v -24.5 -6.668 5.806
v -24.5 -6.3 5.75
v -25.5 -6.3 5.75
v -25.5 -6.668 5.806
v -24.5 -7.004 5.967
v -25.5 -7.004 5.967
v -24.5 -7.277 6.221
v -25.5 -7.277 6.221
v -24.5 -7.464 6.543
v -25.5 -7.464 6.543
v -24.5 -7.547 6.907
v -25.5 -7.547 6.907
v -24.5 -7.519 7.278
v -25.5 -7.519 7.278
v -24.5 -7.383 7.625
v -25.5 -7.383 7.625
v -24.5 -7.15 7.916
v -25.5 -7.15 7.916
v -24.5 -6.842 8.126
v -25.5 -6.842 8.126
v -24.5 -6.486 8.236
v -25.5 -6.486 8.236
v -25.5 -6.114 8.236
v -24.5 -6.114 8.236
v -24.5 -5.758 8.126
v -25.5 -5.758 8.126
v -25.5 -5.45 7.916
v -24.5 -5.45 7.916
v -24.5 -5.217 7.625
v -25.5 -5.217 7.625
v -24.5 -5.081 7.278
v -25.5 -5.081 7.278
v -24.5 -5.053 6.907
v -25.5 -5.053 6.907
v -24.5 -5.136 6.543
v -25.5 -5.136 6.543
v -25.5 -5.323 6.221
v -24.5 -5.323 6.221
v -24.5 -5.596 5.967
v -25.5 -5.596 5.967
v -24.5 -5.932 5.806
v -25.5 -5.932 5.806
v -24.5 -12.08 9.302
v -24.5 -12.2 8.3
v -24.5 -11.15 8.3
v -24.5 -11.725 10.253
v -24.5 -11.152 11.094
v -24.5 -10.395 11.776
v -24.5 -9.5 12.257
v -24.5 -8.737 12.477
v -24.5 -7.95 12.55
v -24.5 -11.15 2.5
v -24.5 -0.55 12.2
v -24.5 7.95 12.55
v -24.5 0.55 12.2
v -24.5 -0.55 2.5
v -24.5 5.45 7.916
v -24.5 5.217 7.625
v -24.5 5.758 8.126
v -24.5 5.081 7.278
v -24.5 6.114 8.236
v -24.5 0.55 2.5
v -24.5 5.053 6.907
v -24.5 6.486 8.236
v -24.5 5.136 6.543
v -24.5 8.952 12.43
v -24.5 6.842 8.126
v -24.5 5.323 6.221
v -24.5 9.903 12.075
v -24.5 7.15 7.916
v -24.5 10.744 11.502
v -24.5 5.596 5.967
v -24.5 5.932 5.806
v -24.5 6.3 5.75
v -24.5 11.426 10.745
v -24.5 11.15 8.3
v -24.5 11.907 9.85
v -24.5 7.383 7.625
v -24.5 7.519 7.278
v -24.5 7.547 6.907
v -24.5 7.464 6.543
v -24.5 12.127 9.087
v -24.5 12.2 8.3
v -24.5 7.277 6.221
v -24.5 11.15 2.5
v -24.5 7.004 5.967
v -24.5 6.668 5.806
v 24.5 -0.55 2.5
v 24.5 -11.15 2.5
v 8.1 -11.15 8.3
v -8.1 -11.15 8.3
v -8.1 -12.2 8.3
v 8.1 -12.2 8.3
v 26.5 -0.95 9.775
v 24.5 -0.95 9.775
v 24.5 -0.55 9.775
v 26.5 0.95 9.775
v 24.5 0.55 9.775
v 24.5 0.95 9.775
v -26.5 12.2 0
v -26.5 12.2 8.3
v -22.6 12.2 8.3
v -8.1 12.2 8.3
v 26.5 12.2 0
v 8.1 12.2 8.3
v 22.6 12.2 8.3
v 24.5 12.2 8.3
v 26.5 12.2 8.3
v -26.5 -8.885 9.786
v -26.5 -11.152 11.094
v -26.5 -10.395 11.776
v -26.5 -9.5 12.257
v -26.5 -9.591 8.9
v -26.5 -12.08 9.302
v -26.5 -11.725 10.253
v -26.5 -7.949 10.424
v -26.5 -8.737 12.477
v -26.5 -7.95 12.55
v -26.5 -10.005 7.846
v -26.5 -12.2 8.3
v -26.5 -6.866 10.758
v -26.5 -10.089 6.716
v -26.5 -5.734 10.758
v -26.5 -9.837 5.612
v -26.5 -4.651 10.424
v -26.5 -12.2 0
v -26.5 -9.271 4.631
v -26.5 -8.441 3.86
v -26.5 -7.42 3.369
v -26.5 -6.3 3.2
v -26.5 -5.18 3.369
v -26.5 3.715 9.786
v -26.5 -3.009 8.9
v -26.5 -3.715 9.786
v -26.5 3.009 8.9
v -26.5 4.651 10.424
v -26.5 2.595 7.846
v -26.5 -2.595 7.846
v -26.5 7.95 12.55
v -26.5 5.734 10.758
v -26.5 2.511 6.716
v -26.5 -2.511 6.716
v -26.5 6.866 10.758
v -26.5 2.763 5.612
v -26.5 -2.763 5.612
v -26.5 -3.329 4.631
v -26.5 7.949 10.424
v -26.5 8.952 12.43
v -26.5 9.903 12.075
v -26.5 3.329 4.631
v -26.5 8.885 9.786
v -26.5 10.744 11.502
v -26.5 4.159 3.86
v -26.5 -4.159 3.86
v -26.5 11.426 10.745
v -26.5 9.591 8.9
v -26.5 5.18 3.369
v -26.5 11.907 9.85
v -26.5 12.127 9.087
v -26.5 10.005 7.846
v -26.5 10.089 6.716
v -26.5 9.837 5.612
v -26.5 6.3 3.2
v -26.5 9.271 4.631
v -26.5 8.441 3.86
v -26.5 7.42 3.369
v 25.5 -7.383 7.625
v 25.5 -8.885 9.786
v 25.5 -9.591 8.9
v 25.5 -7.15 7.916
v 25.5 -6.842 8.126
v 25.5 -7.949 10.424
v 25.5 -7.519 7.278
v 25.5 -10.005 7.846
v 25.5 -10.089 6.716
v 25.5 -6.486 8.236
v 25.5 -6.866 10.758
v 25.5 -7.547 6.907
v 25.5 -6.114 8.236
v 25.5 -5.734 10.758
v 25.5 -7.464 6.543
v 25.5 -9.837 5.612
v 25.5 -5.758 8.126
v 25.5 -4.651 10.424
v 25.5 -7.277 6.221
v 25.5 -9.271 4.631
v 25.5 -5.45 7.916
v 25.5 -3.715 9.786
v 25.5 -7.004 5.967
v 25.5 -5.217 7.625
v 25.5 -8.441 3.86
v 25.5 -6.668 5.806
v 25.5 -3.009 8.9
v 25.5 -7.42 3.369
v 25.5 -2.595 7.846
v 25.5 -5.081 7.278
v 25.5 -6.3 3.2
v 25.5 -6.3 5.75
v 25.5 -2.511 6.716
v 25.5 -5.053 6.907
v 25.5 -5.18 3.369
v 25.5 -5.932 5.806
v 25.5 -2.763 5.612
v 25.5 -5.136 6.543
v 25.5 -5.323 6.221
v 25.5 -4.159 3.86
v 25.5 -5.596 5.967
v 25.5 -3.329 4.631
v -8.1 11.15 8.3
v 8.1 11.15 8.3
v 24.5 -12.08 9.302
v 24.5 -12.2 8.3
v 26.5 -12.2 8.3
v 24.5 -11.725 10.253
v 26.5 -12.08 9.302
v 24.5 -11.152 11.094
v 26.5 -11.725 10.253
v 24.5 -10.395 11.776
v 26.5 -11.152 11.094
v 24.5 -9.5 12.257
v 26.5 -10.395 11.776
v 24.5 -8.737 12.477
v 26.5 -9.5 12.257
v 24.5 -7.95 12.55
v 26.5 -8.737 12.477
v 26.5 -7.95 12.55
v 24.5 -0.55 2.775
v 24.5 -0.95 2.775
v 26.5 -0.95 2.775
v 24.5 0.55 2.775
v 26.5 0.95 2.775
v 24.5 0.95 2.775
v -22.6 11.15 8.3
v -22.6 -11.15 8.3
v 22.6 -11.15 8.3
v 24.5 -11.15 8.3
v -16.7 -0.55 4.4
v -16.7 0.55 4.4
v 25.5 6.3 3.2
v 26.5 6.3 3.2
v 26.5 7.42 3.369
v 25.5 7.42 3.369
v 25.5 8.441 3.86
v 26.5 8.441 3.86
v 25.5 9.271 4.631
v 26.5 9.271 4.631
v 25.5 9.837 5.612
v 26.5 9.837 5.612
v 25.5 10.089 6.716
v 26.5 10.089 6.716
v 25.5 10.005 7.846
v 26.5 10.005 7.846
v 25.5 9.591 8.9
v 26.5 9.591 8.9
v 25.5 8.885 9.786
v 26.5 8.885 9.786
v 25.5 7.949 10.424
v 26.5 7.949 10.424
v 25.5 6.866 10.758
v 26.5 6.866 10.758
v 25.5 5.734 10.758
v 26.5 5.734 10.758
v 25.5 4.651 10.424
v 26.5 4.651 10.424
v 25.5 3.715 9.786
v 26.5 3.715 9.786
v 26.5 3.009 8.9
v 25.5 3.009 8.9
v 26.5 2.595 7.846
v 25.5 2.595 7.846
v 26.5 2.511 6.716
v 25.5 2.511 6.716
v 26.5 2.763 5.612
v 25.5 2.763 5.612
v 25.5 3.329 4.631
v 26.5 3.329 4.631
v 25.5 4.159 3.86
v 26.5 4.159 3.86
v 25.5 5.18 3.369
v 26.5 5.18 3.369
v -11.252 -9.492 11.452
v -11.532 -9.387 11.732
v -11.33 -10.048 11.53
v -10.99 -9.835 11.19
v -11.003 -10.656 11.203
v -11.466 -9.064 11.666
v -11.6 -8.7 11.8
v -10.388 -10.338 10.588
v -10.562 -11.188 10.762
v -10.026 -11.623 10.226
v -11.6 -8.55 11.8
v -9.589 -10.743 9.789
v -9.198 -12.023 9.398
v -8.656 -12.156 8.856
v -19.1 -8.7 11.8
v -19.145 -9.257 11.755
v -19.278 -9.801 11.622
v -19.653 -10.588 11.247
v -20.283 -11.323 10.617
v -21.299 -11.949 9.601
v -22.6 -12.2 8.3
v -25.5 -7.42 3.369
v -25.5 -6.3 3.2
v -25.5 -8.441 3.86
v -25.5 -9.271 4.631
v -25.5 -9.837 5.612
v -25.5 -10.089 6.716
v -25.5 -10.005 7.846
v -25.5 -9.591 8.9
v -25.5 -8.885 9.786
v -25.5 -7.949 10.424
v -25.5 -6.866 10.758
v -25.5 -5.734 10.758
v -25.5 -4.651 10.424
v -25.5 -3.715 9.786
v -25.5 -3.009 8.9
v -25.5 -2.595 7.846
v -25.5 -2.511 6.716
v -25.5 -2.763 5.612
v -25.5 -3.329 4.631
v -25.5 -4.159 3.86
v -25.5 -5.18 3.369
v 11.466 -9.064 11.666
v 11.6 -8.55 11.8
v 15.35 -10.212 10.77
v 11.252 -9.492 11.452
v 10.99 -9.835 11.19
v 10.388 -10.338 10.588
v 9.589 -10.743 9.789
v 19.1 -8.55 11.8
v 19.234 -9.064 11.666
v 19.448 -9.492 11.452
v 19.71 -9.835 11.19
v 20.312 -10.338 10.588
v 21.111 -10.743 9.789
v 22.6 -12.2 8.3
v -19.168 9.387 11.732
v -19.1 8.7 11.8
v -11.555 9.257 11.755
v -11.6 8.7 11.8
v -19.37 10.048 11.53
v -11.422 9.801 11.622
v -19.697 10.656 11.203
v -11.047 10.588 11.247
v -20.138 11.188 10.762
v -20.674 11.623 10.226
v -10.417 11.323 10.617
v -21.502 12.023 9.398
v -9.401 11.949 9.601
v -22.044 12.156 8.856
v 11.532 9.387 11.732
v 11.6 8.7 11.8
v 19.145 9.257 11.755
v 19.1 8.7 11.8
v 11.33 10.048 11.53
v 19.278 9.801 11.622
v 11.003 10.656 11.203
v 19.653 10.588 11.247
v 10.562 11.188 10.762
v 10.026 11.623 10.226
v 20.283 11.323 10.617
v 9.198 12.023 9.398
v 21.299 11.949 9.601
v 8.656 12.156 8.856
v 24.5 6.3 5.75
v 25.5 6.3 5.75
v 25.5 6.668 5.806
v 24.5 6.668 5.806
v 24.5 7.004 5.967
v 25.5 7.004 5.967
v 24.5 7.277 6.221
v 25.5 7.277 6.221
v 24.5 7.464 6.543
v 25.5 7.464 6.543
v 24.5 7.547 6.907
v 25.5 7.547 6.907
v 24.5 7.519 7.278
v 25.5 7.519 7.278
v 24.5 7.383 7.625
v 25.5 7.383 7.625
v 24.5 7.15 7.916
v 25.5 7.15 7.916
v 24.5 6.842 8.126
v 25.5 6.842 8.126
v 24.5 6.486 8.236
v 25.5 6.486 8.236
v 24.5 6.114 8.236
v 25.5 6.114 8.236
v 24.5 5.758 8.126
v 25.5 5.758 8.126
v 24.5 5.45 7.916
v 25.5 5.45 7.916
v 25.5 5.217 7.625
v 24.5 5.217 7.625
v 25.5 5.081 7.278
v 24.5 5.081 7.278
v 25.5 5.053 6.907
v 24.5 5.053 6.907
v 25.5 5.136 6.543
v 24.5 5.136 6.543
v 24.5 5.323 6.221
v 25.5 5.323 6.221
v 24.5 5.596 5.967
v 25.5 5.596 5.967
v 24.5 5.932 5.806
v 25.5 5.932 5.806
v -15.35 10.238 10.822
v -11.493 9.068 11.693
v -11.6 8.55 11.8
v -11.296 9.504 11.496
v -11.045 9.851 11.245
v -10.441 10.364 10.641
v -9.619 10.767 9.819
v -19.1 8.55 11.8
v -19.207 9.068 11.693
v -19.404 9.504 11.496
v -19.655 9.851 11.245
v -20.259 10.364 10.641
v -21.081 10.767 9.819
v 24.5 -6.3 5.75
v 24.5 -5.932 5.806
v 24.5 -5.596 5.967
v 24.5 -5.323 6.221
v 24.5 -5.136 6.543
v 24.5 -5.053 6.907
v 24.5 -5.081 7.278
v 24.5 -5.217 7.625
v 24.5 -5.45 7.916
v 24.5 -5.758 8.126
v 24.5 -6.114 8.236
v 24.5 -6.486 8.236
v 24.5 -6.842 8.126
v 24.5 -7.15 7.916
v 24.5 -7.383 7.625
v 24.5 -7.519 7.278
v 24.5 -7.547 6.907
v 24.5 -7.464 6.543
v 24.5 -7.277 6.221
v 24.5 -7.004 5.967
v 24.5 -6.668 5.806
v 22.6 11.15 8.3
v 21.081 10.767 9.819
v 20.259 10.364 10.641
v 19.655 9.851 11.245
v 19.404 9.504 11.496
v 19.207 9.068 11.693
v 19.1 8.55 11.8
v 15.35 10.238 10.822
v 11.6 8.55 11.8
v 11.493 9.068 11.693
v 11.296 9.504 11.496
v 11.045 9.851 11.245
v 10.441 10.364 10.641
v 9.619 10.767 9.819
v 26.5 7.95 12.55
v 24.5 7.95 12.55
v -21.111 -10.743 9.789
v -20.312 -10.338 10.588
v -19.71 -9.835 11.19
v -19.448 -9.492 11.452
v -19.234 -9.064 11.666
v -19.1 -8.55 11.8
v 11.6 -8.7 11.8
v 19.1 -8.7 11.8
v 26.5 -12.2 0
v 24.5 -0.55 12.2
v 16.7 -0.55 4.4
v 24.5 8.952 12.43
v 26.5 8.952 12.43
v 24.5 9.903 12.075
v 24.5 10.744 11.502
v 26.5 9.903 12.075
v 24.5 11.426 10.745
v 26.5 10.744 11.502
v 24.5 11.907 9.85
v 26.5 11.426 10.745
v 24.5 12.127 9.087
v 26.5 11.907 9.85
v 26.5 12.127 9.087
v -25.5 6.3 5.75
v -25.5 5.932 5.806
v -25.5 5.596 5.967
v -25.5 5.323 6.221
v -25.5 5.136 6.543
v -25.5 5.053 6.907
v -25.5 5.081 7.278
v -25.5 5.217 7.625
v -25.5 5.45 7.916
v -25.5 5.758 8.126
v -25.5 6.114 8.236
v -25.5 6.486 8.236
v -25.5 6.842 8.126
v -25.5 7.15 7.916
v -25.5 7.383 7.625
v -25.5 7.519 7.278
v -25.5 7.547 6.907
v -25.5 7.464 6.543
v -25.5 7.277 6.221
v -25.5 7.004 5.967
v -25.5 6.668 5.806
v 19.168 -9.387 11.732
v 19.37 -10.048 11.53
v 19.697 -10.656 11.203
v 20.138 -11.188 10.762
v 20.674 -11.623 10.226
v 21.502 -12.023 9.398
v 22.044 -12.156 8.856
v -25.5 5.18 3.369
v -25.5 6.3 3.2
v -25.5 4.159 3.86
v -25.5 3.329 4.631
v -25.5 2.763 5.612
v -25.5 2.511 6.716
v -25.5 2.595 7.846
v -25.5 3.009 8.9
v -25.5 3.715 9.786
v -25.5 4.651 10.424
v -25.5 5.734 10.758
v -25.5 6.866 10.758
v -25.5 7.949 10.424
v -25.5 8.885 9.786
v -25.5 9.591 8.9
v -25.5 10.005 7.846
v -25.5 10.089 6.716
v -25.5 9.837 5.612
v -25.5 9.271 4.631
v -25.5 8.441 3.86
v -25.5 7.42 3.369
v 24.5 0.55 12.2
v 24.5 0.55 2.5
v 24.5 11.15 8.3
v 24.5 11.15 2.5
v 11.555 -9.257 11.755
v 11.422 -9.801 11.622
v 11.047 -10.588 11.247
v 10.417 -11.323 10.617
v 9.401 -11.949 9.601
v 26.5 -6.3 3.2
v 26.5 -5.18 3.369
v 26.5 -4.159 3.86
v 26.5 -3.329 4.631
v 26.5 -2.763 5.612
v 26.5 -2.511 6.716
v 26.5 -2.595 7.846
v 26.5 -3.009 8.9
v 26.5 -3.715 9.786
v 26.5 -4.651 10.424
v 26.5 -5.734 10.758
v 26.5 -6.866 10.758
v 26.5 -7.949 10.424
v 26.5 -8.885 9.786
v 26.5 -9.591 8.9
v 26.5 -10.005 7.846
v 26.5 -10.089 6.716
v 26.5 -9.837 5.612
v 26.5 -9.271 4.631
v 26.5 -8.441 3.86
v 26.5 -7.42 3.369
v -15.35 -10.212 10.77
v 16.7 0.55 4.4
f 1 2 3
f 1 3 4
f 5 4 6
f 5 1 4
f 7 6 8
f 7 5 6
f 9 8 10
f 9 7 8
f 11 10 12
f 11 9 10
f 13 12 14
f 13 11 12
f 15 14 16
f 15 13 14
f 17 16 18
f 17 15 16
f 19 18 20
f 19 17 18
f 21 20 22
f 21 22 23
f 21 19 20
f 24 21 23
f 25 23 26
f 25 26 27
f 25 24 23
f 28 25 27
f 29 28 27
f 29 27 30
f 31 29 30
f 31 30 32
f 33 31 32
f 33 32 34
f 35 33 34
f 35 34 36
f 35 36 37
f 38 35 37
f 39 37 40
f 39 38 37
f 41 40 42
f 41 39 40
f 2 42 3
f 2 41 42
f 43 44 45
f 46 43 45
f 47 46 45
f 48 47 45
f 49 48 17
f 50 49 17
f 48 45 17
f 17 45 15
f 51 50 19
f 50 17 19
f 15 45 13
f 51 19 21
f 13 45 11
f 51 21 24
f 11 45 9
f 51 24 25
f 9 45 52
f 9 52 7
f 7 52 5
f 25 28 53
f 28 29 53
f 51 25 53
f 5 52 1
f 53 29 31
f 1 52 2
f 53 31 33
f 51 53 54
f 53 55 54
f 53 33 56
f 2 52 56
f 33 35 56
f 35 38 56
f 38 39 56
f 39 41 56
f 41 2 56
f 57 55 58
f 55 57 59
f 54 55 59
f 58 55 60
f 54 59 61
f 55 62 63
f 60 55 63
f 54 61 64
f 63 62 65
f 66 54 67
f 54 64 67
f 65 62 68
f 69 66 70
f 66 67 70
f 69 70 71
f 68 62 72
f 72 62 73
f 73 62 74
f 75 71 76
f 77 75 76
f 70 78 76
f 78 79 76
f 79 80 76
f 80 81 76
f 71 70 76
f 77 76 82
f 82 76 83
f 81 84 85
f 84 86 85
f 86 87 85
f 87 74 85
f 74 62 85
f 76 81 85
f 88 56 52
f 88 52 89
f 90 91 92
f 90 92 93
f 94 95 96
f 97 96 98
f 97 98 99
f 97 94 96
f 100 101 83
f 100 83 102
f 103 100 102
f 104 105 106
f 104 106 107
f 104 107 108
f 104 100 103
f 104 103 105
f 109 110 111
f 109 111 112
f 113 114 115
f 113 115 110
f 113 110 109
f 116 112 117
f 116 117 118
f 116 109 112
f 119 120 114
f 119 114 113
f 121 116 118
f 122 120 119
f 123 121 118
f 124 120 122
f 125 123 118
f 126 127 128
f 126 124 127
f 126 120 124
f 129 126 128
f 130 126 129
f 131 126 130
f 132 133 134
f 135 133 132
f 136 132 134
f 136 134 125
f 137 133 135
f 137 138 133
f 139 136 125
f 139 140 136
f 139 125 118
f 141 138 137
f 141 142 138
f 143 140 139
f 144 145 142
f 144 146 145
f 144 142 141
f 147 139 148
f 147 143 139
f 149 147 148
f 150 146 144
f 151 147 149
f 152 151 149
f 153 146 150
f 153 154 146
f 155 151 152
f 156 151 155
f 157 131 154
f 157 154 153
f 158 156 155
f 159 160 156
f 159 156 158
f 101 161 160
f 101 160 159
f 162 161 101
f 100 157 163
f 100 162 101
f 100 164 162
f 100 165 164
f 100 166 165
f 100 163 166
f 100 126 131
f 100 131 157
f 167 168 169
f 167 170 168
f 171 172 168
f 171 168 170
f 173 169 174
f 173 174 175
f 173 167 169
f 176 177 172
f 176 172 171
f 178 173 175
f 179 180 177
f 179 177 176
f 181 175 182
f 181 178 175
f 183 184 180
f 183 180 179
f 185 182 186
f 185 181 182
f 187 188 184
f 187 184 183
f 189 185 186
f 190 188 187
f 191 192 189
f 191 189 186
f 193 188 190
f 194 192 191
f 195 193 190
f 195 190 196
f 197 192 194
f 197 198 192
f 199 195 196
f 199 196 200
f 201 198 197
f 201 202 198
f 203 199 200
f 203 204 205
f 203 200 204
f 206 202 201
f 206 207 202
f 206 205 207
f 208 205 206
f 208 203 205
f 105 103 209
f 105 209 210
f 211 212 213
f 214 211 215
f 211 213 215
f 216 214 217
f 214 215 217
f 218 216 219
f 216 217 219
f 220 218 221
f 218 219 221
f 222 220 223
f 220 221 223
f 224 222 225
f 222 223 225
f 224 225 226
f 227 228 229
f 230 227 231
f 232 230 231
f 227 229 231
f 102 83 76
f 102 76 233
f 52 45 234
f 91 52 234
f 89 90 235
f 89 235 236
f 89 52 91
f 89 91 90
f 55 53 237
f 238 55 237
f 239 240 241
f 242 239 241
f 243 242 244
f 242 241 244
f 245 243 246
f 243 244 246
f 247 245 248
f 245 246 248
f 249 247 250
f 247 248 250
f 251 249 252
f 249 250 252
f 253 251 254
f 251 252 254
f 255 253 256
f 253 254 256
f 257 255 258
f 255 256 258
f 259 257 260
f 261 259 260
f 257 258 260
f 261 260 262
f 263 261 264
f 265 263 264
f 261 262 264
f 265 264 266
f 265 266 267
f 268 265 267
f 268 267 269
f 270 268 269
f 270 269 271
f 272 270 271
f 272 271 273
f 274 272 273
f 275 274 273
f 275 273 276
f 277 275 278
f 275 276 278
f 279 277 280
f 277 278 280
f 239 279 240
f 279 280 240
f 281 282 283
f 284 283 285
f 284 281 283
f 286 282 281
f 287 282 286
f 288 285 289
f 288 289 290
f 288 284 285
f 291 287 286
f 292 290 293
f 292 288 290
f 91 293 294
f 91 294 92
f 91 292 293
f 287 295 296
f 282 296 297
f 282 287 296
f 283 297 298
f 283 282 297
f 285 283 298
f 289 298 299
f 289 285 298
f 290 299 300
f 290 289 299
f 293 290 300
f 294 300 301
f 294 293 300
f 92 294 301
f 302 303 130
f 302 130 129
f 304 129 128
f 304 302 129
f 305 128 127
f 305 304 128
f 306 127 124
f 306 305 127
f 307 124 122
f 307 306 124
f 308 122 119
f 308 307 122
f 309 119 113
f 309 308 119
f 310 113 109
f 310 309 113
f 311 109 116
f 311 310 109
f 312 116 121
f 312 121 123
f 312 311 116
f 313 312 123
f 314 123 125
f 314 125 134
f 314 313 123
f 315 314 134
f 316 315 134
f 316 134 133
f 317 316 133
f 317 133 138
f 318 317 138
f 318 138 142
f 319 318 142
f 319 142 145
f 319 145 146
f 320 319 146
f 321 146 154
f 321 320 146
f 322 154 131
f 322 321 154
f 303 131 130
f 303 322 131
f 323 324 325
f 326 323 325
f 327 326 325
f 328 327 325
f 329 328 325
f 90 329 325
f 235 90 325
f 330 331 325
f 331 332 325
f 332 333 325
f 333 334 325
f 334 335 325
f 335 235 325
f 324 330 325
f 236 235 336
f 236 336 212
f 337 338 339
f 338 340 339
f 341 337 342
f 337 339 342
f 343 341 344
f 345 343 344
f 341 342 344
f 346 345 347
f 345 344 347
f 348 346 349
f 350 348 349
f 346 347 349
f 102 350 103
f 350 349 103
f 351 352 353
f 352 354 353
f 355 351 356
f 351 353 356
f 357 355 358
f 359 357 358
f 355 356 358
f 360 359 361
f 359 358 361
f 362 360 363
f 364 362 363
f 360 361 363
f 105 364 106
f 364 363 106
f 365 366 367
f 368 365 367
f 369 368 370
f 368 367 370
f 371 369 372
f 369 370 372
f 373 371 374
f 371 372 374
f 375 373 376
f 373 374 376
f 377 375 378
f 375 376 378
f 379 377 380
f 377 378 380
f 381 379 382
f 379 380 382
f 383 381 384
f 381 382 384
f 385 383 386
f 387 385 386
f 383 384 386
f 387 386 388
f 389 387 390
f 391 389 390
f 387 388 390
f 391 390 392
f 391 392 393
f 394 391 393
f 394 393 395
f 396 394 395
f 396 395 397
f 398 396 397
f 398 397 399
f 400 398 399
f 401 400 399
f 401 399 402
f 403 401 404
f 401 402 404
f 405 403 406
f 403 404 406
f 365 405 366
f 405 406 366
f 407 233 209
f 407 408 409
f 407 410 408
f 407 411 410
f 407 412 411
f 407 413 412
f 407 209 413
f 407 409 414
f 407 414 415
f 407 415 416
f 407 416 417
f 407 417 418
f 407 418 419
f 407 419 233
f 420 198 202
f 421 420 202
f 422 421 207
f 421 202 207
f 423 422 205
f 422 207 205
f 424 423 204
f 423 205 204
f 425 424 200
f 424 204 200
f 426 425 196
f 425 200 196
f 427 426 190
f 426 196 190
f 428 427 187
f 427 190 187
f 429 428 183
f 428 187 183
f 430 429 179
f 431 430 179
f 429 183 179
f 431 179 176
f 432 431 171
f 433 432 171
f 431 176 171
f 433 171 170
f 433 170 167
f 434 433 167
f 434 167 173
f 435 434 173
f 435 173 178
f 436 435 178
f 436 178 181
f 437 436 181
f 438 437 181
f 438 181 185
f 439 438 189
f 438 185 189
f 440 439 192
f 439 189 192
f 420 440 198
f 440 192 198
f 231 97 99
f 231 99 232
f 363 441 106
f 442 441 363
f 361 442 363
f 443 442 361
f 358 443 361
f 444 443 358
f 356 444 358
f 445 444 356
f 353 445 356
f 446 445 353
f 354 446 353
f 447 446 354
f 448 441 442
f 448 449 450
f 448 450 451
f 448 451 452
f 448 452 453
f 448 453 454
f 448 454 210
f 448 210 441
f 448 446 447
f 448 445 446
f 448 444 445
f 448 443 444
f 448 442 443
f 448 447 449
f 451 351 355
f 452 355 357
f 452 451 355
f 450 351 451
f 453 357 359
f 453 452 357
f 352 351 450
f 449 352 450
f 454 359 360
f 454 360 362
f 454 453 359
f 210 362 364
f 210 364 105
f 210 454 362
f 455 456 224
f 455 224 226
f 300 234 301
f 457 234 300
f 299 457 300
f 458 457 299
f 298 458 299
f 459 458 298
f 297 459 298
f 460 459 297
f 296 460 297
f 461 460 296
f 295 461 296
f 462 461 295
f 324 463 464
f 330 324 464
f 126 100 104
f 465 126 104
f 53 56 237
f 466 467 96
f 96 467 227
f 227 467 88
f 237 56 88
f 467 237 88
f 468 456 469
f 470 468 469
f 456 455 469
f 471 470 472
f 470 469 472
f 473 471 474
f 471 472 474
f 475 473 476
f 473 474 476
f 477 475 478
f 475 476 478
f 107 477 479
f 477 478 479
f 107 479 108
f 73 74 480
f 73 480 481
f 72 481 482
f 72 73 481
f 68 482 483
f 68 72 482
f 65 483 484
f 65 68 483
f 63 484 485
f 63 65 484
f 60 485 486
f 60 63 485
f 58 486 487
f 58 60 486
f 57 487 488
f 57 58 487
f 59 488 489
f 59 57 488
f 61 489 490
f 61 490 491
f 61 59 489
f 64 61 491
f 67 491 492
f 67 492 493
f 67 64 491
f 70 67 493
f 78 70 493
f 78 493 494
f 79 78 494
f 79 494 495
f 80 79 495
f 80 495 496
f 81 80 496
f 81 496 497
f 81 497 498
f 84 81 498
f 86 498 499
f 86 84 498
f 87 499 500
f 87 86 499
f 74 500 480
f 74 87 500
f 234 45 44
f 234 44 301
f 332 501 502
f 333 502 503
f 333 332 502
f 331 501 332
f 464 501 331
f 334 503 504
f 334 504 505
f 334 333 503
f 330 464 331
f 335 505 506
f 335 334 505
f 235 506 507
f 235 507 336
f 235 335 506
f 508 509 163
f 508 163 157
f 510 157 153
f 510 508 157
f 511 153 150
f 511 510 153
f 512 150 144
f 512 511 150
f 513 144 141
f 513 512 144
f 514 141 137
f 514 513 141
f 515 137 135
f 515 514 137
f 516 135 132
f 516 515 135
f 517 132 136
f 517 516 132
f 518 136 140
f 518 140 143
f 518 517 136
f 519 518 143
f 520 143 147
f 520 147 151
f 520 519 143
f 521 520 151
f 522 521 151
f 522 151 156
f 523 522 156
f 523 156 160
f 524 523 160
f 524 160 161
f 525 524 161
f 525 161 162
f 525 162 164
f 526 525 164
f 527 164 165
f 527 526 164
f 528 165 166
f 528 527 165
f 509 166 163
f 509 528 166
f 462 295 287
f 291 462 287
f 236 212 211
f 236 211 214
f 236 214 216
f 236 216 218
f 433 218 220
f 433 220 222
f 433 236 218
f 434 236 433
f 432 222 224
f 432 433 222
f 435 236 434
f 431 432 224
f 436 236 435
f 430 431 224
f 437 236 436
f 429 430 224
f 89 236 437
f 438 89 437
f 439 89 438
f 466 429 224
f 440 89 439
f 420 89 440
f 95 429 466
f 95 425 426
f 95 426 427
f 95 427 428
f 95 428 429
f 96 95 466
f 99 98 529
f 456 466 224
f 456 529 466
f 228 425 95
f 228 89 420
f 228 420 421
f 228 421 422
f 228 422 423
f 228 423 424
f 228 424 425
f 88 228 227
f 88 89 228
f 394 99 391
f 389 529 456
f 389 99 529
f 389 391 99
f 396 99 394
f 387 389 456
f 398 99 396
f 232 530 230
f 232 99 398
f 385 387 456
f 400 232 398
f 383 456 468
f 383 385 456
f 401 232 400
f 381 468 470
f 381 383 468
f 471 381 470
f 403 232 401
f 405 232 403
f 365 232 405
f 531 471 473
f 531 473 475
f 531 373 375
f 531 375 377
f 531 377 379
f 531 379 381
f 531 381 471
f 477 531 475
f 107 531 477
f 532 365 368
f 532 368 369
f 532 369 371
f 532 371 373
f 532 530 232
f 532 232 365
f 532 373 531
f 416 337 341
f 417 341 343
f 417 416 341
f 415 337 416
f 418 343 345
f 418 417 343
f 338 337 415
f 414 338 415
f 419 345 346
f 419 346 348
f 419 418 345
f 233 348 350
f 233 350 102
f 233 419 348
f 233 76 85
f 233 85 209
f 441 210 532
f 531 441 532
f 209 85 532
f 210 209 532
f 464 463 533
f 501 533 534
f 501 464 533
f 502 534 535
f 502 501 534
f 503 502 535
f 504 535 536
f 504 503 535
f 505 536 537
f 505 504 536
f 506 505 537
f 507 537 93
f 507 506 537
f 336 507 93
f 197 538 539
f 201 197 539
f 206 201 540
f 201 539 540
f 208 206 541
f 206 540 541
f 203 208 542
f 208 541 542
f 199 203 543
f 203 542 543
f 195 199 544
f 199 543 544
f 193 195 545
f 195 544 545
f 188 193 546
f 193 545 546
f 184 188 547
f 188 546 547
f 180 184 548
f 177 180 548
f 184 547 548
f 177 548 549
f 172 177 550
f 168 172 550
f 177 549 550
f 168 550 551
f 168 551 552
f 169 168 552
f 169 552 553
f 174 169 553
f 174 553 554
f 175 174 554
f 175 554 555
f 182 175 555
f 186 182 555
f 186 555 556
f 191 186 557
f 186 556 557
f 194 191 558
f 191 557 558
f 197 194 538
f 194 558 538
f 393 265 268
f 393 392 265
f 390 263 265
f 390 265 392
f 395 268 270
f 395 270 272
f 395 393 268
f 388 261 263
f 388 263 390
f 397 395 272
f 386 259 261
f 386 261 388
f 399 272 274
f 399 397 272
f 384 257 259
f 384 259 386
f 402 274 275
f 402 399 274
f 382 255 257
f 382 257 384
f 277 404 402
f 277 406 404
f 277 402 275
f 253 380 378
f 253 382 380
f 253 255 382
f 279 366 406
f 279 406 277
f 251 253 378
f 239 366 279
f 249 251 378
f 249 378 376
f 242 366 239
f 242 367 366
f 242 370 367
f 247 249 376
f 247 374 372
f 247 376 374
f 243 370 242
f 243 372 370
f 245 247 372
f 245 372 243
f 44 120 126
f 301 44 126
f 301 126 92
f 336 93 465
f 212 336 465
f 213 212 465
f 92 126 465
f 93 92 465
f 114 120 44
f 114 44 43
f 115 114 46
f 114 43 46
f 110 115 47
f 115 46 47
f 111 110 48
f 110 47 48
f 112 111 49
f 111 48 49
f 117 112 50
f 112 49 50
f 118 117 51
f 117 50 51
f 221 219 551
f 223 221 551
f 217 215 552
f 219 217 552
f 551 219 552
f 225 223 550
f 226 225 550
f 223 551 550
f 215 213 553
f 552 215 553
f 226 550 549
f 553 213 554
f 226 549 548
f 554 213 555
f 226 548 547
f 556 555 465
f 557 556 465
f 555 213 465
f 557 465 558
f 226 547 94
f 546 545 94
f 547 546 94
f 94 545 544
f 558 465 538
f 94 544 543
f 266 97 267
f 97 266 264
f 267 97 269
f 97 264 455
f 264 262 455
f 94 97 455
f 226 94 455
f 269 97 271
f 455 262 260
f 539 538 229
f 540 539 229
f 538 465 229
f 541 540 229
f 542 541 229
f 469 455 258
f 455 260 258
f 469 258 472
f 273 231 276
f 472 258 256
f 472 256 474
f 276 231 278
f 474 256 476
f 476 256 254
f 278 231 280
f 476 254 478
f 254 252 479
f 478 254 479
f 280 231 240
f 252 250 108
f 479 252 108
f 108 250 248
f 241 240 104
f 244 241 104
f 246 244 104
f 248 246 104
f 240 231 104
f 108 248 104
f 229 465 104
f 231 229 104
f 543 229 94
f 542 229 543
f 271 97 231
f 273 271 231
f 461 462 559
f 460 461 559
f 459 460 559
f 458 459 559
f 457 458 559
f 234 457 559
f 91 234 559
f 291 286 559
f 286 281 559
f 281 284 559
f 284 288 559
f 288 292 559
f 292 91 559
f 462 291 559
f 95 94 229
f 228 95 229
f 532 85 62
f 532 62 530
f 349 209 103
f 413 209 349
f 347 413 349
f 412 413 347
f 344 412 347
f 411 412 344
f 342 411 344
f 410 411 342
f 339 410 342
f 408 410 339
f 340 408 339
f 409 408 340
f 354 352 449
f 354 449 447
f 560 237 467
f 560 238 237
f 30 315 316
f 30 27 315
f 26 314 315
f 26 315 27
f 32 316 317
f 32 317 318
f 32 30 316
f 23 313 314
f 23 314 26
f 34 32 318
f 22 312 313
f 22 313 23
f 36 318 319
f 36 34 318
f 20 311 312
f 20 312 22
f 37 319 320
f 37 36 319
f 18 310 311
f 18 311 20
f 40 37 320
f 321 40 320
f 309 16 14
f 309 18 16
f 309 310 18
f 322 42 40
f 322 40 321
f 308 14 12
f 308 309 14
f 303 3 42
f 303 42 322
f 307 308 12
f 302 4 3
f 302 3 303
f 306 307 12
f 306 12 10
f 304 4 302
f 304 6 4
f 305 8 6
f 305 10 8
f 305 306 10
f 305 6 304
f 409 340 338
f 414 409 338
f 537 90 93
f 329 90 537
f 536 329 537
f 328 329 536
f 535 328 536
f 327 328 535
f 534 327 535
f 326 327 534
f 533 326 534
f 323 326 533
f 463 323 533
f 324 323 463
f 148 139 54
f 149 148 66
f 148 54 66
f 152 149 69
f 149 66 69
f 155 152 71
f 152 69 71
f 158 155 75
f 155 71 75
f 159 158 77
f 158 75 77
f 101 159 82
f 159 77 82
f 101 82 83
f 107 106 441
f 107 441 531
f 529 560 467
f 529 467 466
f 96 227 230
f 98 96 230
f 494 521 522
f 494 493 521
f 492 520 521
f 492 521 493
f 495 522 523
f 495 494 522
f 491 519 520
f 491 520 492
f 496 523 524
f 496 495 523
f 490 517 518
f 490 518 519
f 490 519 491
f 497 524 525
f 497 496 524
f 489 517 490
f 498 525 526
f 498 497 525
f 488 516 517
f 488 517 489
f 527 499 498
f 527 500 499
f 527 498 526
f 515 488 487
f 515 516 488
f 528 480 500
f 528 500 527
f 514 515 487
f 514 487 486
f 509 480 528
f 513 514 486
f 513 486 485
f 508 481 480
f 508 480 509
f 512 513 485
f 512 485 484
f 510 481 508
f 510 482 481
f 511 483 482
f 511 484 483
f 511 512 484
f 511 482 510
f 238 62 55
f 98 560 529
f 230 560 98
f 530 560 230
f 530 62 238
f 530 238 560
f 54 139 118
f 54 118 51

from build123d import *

# Parameters (mm, degrees)
SKICA1_W                 = 53
SKICA1_H                 = 24.4
P_IDAT_VYSUNUT_M1_DEPTH  = 2.5
SKICA2_W                 = 49
SKICA2_H                 = 1.05
P_IDAT_VYSUNUT_M2_DEPTH  = 9.3
SKICA3_W                 = 16.2
SKICA3_H                 = 1.05
SKICA3_W_2               = 1.9
ODEBRAT_VYSUNUT_M1_DEPTH = 3.5
SKICA7_W                 = 14.5
SKICA7_H                 = 3.5
P_IDAT_VYSUNUT_M3_DEPTH  = 2.6
SKICA6_W                 = 14.5
SKICA6_H                 = 3.5
P_IDAT_VYSUNUT_M4_DEPTH  = 2.6
SKICA8_W                 = 14.5
SKICA8_H                 = 3.5
P_IDAT_VYSUNUT_M5_DEPTH  = 2.6
ZAOBLIT3_R               = 3.5
ODEBRAT_START            = -45.2
ODEBRAT_VYSUNUT_M2_DEPTH = 45.2
ODEBRAT_VYSUNUT_M3_DEPTH = 45.2
ZKOSEN_3_SIZE            = 3.5
SKICA14_W                = 2
SKICA14_H                = 24.4
P_IDAT_VYSUNUT_M6_DEPTH  = 10.05
ZAOBLIT4_R               = 4.25
SKICA17_W                = 7
SKICA17_H                = 1.9
ODEBRAT_VYSUNUT_M4_DEPTH = 2.05
SKICA18_R                = 3.8
ODEBRAT_VYSUNUT_M5_DEPTH = 1
SKICA20_R                = 1.25
ODEBRAT_VYSUNUT_M6_DEPTH = 1
ODEBRAT_START_2          = -1
SKICA21_R                = 3.8
ODEBRAT_VYSUNUT_M7_DEPTH = 1
SKICA22_R                = 1.25
ODEBRAT_VYSUNUT_M8_DEPTH = 1
SKICA23_W                = 49
SKICA23_H                = 1.1
P_IDAT_VYSUNUT_M7_DEPTH  = 9.7
SKICA24_W                = 26
SKICA24_H                = 1.1
ODEBRAT_VYSUNUT_M9_DEPTH = 7.8


with BuildPart() as part:
    # Skica1 → Přidat vysunutím1 (new body)
    with BuildSketch(Plane.XY):
        Rectangle(SKICA1_W, SKICA1_H)
    extrude(amount=P_IDAT_VYSUNUT_M1_DEPTH)

    # Skica2 → Přidat vysunutím2 (add)
    with BuildSketch(Plane.XY.offset(2.5)):
        with Locations((0, 11.675)):
            Rectangle(SKICA2_W, SKICA2_H)
        with Locations((0, -11.675)):
            Rectangle(SKICA2_W, SKICA2_H)
    extrude(amount=P_IDAT_VYSUNUT_M2_DEPTH)

    # Skica3 → Odebrat vysunutím1 (cut)
    with BuildSketch(Plane.XY.offset(11.8)):
        with Locations((0, -11.675)):
            Rectangle(SKICA3_W, SKICA3_H)
        with Locations((0, 11.675)):
            Rectangle(SKICA3_W, SKICA3_H)
        with Locations((-23.55, 11.675)):
            Rectangle(SKICA3_W_2, SKICA3_H)
        with Locations((-23.55, -11.675)):
            Rectangle(SKICA3_W_2, SKICA3_H)
        with Locations((23.55, 11.675)):
            Rectangle(SKICA3_W_2, SKICA3_H)
        with Locations((23.55, -11.675)):
            Rectangle(SKICA3_W_2, SKICA3_H)
    extrude(amount=-ODEBRAT_VYSUNUT_M1_DEPTH, mode=Mode.SUBTRACT)

    # Skica7 → Přidat vysunutím3 (add)
    with BuildSketch(Plane(origin=(0, 11.15, 0), x_dir=(-1, 0, 0), z_dir=(0, -1, 0))):
        with Locations((15.35, -10.05)):
            Rectangle(SKICA7_W, SKICA7_H)
        with Locations((-15.35, -10.05)):
            Rectangle(SKICA7_W, SKICA7_H)
    extrude(amount=P_IDAT_VYSUNUT_M3_DEPTH)

    # Skica6 → Přidat vysunutím4 (add)
    with BuildSketch(Plane(origin=(0, -11.15, 0), x_dir=(1, 0, 0), z_dir=(0, 1, 0))):
        with Locations((-15.35, -10.05)):
            Rectangle(SKICA6_W, SKICA6_H)
    extrude(amount=P_IDAT_VYSUNUT_M4_DEPTH)

    # Skica8 → Přidat vysunutím5 (add)
    with BuildSketch(Plane(origin=(0, -11.15, 0), x_dir=(1, 0, 0), z_dir=(0, 1, 0))):
        with Locations((15.35, -10.05)):
            Rectangle(SKICA8_W, SKICA8_H)
    extrude(amount=P_IDAT_VYSUNUT_M5_DEPTH)

    # Zaoblit3
    zaoblit3_edges = [part.edges().sort_by_distance(p)[0] for p in [
        (15.35, 12.2, 11.8),
        (-15.35, 12.2, 11.8),
        (-15.35, -12.2, 11.8),
        (15.35, -12.2, 11.8),
    ]]
    fillet(zaoblit3_edges, radius=ZAOBLIT3_R)

    # Skica11 → Odebrat vysunutím2 (cut)
    with BuildSketch(Plane(origin=(22.6, 0, 0), x_dir=(0, 0, -1), z_dir=(1, 0, 0)).offset(ODEBRAT_START)):
        with BuildLine():
            Line((-11.8, -8.55), (-8.3, -8.55))
            Line((-8.3, -8.55), (-8.3, -11.15))
            add(Edge.make_bspline(
                [(-8.3, -11.15), (-11.489612279, -10.573938185), (-11.8, -8.55)],
                knots=[0, 0, 0, 0.822635588, 0.822635588, 0.822635588], degree=2))
        make_face()
    extrude(amount=ODEBRAT_VYSUNUT_M2_DEPTH, mode=Mode.SUBTRACT)

    # Skica13 → Odebrat vysunutím3 (cut)
    with BuildSketch(Plane(origin=(22.6, 0, 0), x_dir=(0, 0, -1), z_dir=(1, 0, 0)).offset(ODEBRAT_START)):
        with BuildLine():
            Line((-11.8, 8.55), (-8.3, 8.55))
            Line((-8.3, 8.55), (-8.3, 11.15))
            add(Edge.make_bspline(
                [(-8.3, 11.15), (-11.594475323, 10.62667069), (-11.8, 8.55)],
                knots=[0, 0, 0, 0.882557327, 0.882557327, 0.882557327], degree=2))
        make_face()
    extrude(amount=ODEBRAT_VYSUNUT_M3_DEPTH, mode=Mode.SUBTRACT)

    # Zkosení3
    # the kernel refuses this chamfer: 3.5 mm, written as the material it takes off along each edge
    with BuildSketch(Plane(origin=(-22.6, 0.450890458, 11.8), x_dir=(-0.027495876610586112, 0, -0.9996219169112968), z_dir=(0, -1, 0)), Plane(origin=(-8.1, 0.450890458, 11.8), x_dir=(-0.9996219169112968, 0, 0.027495876610586605), z_dir=(0, -1, 0)), Plane(origin=(-22.6, -0.450890458, 11.8), x_dir=(0.9996219169112968, 3.891912830509087e-15, 0.02749587661058662), z_dir=(0, 1, 0)), Plane(origin=(-8.1, -0.450890458, 11.8), x_dir=(0.027495876610586605, 0, -0.9996219169112968), z_dir=(0, 1, 0)), Plane(origin=(8.1, -0.450890458, 11.8), x_dir=(0.9996219169112968, 0, 0.027495876610586605), z_dir=(0, 1, 0)), Plane(origin=(22.6, -0.450890458, 11.8), x_dir=(0.027495876610586112, 0, -0.9996219169112968), z_dir=(0, 1, 0)), Plane(origin=(8.1, 0.450890458, 11.8), x_dir=(-0.027495876610586605, 0, -0.9996219169112968), z_dir=(0, -1, 0)), Plane(origin=(22.6, 0.450890458, 11.8), x_dir=(-0.9996219169112968, 3.891912830509087e-15, 0.02749587661058662), z_dir=(0, -1, 0))) as zkosen_3_piece_1:
        Polygon((ZKOSEN_3_SIZE * 0.999621916911, ZKOSEN_3_SIZE * 0.0274958766106), (-ZKOSEN_3_SIZE * 0.0274958766106, ZKOSEN_3_SIZE * 0.999621916911), (0, 0), align=None)
    extrude(amount=18.151780916, mode=Mode.SUBTRACT)

    # Skica14 → Přidat vysunutím6 (add)
    with BuildSketch(Plane.XY.offset(2.5)):
        with Locations((25.5, 0)):
            Rectangle(SKICA14_W, SKICA14_H)
        with Locations((-25.5, 0)):
            Rectangle(SKICA14_W, SKICA14_H)
    extrude(amount=P_IDAT_VYSUNUT_M6_DEPTH)

    # Zaoblit4
    zaoblit4_edges = [part.edges().sort_by_distance(p)[0] for p in [
        (-25.5, 12.2, 12.55),
        (-25.5, -12.2, 12.55),
        (25.5, -12.2, 12.55),
        (25.5, 12.2, 12.55),
    ]]
    fillet(zaoblit4_edges, radius=ZAOBLIT4_R)

    # Skica17 → Odebrat vysunutím4 (cut)
    with BuildSketch(Plane(origin=(26.5, 0, 0), x_dir=(0, 0, -1), z_dir=(1, 0, 0))):
        with Locations((-6.275, 0)):
            Rectangle(SKICA17_W, SKICA17_H)
    extrude(amount=-ODEBRAT_VYSUNUT_M4_DEPTH, mode=Mode.SUBTRACT)

    # Skica18 → Odebrat vysunutím5 (cut)
    with BuildSketch(Plane(origin=(26.5, 0, 0), x_dir=(0, 0, -1), z_dir=(1, 0, 0))):
        with Locations((-7, 6.3)):
            Circle(SKICA18_R)
        with Locations((-7, -6.3)):
            Circle(SKICA18_R)
    extrude(amount=-ODEBRAT_VYSUNUT_M5_DEPTH, mode=Mode.SUBTRACT)

    # Skica20 → Odebrat vysunutím6 (cut)
    with BuildSketch(Plane(origin=(25.5, 0, 0), x_dir=(0, 0, -1), z_dir=(1, 0, 0))):
        with Locations((-7, -6.3)):
            Circle(SKICA20_R)
        with Locations((-7, 6.3)):
            Circle(SKICA20_R)
    extrude(amount=-ODEBRAT_VYSUNUT_M6_DEPTH, mode=Mode.SUBTRACT)

    # Skica21 → Odebrat vysunutím7 (cut)
    with BuildSketch(Plane.ZY.offset(26.5).offset(ODEBRAT_START_2)):
        with Locations(Location((7, 6.3, 0), (0, 0, 180))):
            Circle(SKICA21_R)
        with Locations(Location((7, -6.3, 0), (0, 0, 180))):
            Circle(SKICA21_R)
    extrude(amount=ODEBRAT_VYSUNUT_M7_DEPTH, mode=Mode.SUBTRACT)

    # Skica22 → Odebrat vysunutím8 (cut)
    with BuildSketch(Plane.ZY.offset(25.5).offset(ODEBRAT_START_2)):
        with Locations(Location((7, -6.3, 0), (0, 0, 180))):
            Circle(SKICA22_R)
        with Locations(Location((7, 6.3, 0), (0, 0, 180))):
            Circle(SKICA22_R)
    extrude(amount=ODEBRAT_VYSUNUT_M8_DEPTH, mode=Mode.SUBTRACT)

    # Skica23 → Přidat vysunutím7 (add)
    with BuildSketch(Plane.XY.offset(2.5)):
        Rectangle(SKICA23_W, SKICA23_H)
    extrude(amount=P_IDAT_VYSUNUT_M7_DEPTH)

    # Skica24 → Odebrat vysunutím9 (cut)
    with BuildSketch(Plane.XY.offset(12.2)):
        Rectangle(SKICA24_W, SKICA24_H)
    extrude(amount=-ODEBRAT_VYSUNUT_M9_DEPTH, mode=Mode.SUBTRACT)

    # Zkosení5
    # the kernel refuses this chamfer: 11.5 mm, written as the material it takes off along each edge
    with BuildSketch(Plane(origin=(-13, -0.55, 12.2), x_dir=(-0.9996219169112968, 0, 0.027495876610586382), z_dir=(0, 1, 0))) as zkosen_5_piece_1_section:
        with BuildLine():
            Line((11.829741745, 0), (-0.650292281, -11.811854626))
            Line((-0.650292281, -11.811854626), (-0.880205322, -11.805530574))
            ThreePointArc((-0.880205322, -11.805530574), (-0.392486111, -5.904075041), (-0.229913041, 0.006324052))
            Line((-0.229913041, 0.006324052), (0.006324052, 0.229913041))
            ThreePointArc((0.006324052, 0.229913041), (5.916723144, 0.067339971), (11.836065796, 0.229913041))
            Line((11.836065796, 0.229913041), (11.829741745, 0))
        make_face()
    zkosen_5_piece_1 = extrude(amount=1.1, mode=Mode.PRIVATE)
    zkosen_5_piece_1 = split(zkosen_5_piece_1, bisect_by=Plane(origin=(-24.5, 0, 9.11358538), z_dir=(1, 0, 0)), keep=Keep.TOP, mode=Mode.PRIVATE)
    zkosen_5_piece_1 = split(zkosen_5_piece_1, bisect_by=Plane(origin=(-17.151338027, 0, 4.4), z_dir=(0, 0, 1)), keep=Keep.TOP, mode=Mode.PRIVATE)
    add(zkosen_5_piece_1, mode=Mode.SUBTRACT)

    # Zkosení6
    # the kernel refuses this chamfer: 11.5 mm, written as the material it takes off along each edge
    with BuildSketch(Plane(origin=(13, 0.55, 12.2), x_dir=(-0.02749587661058638, 0, -0.9996219169112968), z_dir=(0, -1, 0))) as zkosen_6_piece_1_section:
        with BuildLine():
            Line((11.829741745, 0), (-0.650292281, 11.811854626))
            Line((-0.650292281, 11.811854626), (-0.880205322, 11.805530574))
            ThreePointArc((-0.880205322, 11.805530574), (-0.392486111, 5.904075041), (-0.229913041, -0.006324052))
            Line((-0.229913041, -0.006324052), (0.006324052, -0.229913041))
            ThreePointArc((0.006324052, -0.229913041), (5.916723144, -0.067339971), (11.836065796, -0.229913041))
            Line((11.836065796, -0.229913041), (11.829741745, 0))
        make_face()
    zkosen_6_piece_1 = extrude(amount=1.1, mode=Mode.PRIVATE)
    zkosen_6_piece_1 = split(zkosen_6_piece_1, bisect_by=Plane(origin=(24.5, 0, 9.11358538), z_dir=(-1, 0, 0)), keep=Keep.TOP, mode=Mode.PRIVATE)
    zkosen_6_piece_1 = split(zkosen_6_piece_1, bisect_by=Plane(origin=(17.151338027, 0, 4.4), z_dir=(0, 0, 1)), keep=Keep.TOP, mode=Mode.PRIVATE)
    add(zkosen_6_piece_1, mode=Mode.SUBTRACT)


solid = part.part
